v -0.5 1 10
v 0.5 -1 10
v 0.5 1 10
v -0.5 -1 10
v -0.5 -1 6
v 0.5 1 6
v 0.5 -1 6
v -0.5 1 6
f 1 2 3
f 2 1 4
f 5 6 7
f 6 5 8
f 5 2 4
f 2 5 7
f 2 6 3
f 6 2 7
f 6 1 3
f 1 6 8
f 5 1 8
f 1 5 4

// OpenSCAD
translate([0.0, 0.0, 8.0]) {
    cube(size=[1.0, 2.0, 4.0], center=true);
};
